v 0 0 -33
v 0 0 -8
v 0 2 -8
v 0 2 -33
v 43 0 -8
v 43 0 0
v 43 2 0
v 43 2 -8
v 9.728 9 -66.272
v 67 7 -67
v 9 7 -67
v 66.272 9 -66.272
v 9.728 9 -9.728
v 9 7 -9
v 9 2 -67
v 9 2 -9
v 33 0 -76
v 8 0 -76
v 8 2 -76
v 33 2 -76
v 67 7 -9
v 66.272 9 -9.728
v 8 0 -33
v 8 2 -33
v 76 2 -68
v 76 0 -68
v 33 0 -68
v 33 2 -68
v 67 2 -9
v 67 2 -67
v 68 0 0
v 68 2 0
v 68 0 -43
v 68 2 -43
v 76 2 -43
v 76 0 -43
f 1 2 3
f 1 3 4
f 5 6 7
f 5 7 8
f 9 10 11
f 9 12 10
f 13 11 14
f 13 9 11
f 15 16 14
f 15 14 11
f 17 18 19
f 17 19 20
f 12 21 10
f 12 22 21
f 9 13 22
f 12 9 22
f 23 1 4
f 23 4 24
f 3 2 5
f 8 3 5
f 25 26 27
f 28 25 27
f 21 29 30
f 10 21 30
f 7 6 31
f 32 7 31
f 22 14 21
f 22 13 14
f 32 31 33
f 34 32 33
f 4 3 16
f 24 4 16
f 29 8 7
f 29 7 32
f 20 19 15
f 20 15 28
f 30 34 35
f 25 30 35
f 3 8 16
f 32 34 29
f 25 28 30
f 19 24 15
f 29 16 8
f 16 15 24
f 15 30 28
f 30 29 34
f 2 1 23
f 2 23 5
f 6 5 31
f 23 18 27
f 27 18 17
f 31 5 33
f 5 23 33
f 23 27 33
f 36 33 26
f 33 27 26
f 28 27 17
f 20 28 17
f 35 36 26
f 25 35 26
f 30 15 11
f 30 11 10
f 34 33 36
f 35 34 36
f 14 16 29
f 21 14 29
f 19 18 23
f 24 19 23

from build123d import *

# Parameters (mm, degrees)
BOSS_EXTRU_1_DEPTH = 2
ESQUISSE2_W        = 58
ESQUISSE2_H        = 58
BOSS_EXTRU_2_DEPTH = 5
BOSS_EXTRU_3_START = 5
ESQUISSE2_3_W      = 58
ESQUISSE2_3_H      = 58
BOSS_EXTRU_3_DEPTH = 2
BOSS_EXTRU_3_TAPER = 20


with BuildPart() as part:
    # Esquisse1 → Boss.-Extru.1 (new body)
    with BuildSketch(Plane(origin=(0, 0, 0), x_dir=(1, 0, 0), z_dir=(0, 1, 0))):
        Polygon((8, 33), (0, 33), (0, 8), (43, 8), (43, 0), (68, 0), (68, 43), (76, 43), (76, 68), (33, 68), (33, 76), (8, 76), align=None)
    extrude(amount=BOSS_EXTRU_1_DEPTH)

    # Esquisse2 → Boss.-Extru.2 (add)
    with BuildSketch(Plane(origin=(0, 2, 0), x_dir=(1, 0, 0), z_dir=(0, 1, 0))):
        with Locations((38, 38)):
            Rectangle(ESQUISSE2_W, ESQUISSE2_H)
    extrude(amount=BOSS_EXTRU_2_DEPTH)

    # Esquisse2<3> → Boss.-Extru.3 (add)
    with BuildSketch(Plane(origin=(0, 2, 0), x_dir=(1, 0, 0), z_dir=(0, 1, 0)).offset(BOSS_EXTRU_3_START)):
        with Locations((38, 38)):
            Rectangle(ESQUISSE2_3_W, ESQUISSE2_3_H)
    extrude(amount=BOSS_EXTRU_3_DEPTH, taper=BOSS_EXTRU_3_TAPER)


solid = part.part
